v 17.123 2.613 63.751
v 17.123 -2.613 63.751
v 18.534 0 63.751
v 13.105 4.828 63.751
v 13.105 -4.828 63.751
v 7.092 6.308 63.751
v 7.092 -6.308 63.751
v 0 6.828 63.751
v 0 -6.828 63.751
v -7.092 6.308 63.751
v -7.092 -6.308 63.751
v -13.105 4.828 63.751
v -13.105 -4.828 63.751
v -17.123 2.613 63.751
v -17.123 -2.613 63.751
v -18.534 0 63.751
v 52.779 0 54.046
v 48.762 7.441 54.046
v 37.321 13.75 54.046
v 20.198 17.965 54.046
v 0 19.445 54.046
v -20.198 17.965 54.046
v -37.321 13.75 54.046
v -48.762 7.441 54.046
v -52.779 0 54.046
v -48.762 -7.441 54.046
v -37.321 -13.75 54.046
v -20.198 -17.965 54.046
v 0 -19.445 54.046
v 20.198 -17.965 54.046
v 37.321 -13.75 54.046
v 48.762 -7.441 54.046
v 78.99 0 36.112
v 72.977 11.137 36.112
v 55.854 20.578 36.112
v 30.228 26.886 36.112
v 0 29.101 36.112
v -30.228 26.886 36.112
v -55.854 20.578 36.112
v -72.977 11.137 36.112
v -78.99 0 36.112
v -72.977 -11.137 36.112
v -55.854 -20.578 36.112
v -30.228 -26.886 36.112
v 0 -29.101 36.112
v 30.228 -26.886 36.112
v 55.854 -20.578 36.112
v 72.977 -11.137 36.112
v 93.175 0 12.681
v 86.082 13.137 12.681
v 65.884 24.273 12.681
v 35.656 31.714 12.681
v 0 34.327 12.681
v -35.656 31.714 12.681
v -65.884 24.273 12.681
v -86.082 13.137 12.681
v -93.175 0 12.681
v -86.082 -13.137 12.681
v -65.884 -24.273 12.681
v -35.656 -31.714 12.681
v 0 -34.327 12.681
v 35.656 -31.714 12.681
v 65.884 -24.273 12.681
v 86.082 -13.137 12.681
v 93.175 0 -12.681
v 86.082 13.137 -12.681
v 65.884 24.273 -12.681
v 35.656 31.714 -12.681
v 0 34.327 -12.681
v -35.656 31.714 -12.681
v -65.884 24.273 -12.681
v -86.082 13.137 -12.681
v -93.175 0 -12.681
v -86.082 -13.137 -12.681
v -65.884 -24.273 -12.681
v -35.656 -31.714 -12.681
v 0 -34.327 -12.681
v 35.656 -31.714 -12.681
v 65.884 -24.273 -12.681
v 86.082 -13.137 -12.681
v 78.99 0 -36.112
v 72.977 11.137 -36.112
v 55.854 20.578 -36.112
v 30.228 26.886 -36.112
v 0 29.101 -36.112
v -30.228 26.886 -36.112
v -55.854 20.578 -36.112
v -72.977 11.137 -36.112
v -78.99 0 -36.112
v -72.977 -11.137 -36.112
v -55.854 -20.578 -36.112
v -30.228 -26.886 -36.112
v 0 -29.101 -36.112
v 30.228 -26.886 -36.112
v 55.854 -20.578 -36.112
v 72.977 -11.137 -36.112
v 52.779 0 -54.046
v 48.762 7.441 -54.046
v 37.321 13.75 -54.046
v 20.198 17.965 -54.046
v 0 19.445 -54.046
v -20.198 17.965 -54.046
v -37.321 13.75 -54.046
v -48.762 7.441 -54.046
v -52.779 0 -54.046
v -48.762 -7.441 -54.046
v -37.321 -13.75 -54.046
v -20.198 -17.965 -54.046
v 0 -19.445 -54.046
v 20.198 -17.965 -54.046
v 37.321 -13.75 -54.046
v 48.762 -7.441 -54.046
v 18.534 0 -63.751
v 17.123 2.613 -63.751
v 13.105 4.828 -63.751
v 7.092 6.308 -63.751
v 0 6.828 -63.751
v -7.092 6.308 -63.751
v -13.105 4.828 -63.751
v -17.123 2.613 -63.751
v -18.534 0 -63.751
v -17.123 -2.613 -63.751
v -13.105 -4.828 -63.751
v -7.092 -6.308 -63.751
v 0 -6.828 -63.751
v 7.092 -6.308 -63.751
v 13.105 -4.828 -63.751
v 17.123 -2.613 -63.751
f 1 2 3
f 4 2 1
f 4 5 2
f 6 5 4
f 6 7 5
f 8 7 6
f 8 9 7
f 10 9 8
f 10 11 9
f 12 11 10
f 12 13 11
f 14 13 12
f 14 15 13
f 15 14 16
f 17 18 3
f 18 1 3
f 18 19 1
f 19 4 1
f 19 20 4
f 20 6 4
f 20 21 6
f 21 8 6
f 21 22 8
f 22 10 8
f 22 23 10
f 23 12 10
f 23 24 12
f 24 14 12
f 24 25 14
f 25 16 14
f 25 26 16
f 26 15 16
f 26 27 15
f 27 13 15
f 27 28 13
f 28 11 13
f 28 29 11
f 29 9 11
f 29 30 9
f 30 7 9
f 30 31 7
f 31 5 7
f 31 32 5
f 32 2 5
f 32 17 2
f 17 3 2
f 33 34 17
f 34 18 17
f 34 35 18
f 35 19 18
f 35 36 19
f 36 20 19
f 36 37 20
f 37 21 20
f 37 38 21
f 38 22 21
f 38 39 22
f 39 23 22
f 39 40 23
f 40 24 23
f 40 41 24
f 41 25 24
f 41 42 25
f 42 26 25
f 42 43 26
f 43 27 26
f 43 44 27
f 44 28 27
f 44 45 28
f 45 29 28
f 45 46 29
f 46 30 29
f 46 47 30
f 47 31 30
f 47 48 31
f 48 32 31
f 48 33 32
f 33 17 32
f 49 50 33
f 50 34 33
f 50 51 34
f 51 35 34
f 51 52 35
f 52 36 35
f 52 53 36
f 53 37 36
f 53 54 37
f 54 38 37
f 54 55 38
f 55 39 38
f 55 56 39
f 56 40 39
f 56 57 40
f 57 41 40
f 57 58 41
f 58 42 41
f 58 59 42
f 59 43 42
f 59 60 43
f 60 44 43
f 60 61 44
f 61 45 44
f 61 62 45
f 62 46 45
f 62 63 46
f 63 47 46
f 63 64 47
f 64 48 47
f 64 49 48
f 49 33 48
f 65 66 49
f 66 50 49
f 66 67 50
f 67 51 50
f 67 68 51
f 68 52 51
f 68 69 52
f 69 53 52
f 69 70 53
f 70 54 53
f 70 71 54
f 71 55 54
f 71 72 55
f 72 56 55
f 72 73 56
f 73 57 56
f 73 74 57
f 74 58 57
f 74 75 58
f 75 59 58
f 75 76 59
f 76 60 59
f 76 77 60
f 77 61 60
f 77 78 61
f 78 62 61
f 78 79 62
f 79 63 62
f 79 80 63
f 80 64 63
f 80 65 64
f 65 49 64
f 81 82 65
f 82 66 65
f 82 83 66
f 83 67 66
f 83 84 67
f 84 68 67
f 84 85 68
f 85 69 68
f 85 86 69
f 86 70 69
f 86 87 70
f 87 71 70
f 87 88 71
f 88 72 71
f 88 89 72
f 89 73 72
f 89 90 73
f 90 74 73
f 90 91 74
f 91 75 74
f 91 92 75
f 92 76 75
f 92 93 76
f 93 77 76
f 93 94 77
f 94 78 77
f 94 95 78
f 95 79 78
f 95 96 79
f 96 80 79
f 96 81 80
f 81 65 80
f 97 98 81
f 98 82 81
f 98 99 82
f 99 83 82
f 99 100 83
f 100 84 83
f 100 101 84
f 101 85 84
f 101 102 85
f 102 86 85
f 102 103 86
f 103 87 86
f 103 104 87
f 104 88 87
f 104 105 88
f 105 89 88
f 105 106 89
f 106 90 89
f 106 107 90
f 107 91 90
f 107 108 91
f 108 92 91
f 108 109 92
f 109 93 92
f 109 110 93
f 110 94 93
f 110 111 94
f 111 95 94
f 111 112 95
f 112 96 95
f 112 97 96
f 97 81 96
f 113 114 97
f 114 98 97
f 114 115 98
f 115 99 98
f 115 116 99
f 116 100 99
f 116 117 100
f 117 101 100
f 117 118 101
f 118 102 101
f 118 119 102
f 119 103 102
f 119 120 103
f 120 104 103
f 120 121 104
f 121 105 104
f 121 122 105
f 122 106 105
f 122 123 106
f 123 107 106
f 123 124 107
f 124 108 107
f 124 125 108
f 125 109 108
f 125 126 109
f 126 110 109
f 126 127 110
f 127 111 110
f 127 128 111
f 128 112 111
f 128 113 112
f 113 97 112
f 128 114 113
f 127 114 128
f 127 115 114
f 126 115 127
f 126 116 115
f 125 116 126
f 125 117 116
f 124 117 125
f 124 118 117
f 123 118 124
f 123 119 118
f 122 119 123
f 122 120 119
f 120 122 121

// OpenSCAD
// Generated by SolidPython 1.0.1 on 2020-07-29 00:46:53


scale(v = [19, 7, 13]) {
	sphere(r = 5);
}
/***********************************************
*********      SolidPython code:      **********
************************************************
 
# import packages: SolidPython
from solid import *
from solid.utils import *
from itertools import chain, combinations, permutations


class Resize:

    def __init__(self, scad_file):
        self.scad_file = scad_file
        #self.scad_file = import_scad(scad_file)
        # cone/cylinder param:
        self.r1 = 0
        self.r2 = 0
        self.h = 0
        # rectangular prism param:
        self.w = 0
        self.l = 0
        # ellipse param:
        self.r = 0

    # import OpenScad code (file name corresponds to shape)


    # classify shape + parameters
    def assign(self, param1, param2, param3):
        if self.scad_file == 'cone.scad':
            self.r1 = param1
            self.r2 = param2
            self.h = param3
        elif self.scad_file == 'cylinder.scad':
            self.r1 = param1
            self.r2 = param2
            self.h = param3
        elif self.scad_file == 'rectangularPrism.scad':
            self.h = param1
            self.l = param2
            self.w = param3
        else:
            self.r = param1
            self.h = param2

    # resize parameters
    def iterate(self):
        x = range(3, 20, 2)
        i = 1
        if self.scad_file == 'cone.scad':
            tempList = list(permutations(x, 2))
            for temp in tempList:
                param1 = temp[0]
                param2 = temp[1]
                filepath = 'produced_scad_files/' + 'cone' + str(param1) + '_' + str(param2) + '_' + '.scad'
                scad_render_to_file(cylinder(h=param1, r1=param2, r2=0), filepath)

        elif self.scad_file == 'cylinder.scad':
            tempList = list(permutations(x, 3))
            for temp in tempList:
                param1 = temp[0]
                param2 = temp[1]
                filepath = 'produced_scad_files/' + 'cylinder' + str(param1) + '_' + str(param2) + '_' + '.scad'
                scad_render_to_file(cylinder(h=param1, r1=param2, r2=param2), filepath)

        elif self.scad_file == 'rectangularPrism.scad':
            tempList = list(permutations(x, 3))
            for temp in tempList:
                param1 = temp[0]
                param2 = temp[1]
                param3 = temp[2]
                filepath = 'produced_scad_files/' + 'rectangularPrism' + str(param1) + '_' + str(param2) + '_' + str(
                    param3) + '.scad'
                scad_render_to_file(cube(size=(param1, param2, param3)), filepath)

        elif self.scad_file == 'ellipse.scad':
            tempList = list(permutations(x, 4))
            for temp in tempList:
                param1 = temp[0]
                param2 = temp[1]
                param3 = temp[2]
                param4 = temp[3]
                filepath = 'produced_scad_files/' + 'ellipse' + str(param1) + '_' + str(param2) + '_' + str(param3) + '_' + str(param4) + '.scad'
                scad_render_to_file(scale([param1, param2, param3])(sphere(r=param4)), filepath)

    def render_to_scadfile(self):
        scad_render_to_file(scad, 'example.scad') 
 
************************************************/
